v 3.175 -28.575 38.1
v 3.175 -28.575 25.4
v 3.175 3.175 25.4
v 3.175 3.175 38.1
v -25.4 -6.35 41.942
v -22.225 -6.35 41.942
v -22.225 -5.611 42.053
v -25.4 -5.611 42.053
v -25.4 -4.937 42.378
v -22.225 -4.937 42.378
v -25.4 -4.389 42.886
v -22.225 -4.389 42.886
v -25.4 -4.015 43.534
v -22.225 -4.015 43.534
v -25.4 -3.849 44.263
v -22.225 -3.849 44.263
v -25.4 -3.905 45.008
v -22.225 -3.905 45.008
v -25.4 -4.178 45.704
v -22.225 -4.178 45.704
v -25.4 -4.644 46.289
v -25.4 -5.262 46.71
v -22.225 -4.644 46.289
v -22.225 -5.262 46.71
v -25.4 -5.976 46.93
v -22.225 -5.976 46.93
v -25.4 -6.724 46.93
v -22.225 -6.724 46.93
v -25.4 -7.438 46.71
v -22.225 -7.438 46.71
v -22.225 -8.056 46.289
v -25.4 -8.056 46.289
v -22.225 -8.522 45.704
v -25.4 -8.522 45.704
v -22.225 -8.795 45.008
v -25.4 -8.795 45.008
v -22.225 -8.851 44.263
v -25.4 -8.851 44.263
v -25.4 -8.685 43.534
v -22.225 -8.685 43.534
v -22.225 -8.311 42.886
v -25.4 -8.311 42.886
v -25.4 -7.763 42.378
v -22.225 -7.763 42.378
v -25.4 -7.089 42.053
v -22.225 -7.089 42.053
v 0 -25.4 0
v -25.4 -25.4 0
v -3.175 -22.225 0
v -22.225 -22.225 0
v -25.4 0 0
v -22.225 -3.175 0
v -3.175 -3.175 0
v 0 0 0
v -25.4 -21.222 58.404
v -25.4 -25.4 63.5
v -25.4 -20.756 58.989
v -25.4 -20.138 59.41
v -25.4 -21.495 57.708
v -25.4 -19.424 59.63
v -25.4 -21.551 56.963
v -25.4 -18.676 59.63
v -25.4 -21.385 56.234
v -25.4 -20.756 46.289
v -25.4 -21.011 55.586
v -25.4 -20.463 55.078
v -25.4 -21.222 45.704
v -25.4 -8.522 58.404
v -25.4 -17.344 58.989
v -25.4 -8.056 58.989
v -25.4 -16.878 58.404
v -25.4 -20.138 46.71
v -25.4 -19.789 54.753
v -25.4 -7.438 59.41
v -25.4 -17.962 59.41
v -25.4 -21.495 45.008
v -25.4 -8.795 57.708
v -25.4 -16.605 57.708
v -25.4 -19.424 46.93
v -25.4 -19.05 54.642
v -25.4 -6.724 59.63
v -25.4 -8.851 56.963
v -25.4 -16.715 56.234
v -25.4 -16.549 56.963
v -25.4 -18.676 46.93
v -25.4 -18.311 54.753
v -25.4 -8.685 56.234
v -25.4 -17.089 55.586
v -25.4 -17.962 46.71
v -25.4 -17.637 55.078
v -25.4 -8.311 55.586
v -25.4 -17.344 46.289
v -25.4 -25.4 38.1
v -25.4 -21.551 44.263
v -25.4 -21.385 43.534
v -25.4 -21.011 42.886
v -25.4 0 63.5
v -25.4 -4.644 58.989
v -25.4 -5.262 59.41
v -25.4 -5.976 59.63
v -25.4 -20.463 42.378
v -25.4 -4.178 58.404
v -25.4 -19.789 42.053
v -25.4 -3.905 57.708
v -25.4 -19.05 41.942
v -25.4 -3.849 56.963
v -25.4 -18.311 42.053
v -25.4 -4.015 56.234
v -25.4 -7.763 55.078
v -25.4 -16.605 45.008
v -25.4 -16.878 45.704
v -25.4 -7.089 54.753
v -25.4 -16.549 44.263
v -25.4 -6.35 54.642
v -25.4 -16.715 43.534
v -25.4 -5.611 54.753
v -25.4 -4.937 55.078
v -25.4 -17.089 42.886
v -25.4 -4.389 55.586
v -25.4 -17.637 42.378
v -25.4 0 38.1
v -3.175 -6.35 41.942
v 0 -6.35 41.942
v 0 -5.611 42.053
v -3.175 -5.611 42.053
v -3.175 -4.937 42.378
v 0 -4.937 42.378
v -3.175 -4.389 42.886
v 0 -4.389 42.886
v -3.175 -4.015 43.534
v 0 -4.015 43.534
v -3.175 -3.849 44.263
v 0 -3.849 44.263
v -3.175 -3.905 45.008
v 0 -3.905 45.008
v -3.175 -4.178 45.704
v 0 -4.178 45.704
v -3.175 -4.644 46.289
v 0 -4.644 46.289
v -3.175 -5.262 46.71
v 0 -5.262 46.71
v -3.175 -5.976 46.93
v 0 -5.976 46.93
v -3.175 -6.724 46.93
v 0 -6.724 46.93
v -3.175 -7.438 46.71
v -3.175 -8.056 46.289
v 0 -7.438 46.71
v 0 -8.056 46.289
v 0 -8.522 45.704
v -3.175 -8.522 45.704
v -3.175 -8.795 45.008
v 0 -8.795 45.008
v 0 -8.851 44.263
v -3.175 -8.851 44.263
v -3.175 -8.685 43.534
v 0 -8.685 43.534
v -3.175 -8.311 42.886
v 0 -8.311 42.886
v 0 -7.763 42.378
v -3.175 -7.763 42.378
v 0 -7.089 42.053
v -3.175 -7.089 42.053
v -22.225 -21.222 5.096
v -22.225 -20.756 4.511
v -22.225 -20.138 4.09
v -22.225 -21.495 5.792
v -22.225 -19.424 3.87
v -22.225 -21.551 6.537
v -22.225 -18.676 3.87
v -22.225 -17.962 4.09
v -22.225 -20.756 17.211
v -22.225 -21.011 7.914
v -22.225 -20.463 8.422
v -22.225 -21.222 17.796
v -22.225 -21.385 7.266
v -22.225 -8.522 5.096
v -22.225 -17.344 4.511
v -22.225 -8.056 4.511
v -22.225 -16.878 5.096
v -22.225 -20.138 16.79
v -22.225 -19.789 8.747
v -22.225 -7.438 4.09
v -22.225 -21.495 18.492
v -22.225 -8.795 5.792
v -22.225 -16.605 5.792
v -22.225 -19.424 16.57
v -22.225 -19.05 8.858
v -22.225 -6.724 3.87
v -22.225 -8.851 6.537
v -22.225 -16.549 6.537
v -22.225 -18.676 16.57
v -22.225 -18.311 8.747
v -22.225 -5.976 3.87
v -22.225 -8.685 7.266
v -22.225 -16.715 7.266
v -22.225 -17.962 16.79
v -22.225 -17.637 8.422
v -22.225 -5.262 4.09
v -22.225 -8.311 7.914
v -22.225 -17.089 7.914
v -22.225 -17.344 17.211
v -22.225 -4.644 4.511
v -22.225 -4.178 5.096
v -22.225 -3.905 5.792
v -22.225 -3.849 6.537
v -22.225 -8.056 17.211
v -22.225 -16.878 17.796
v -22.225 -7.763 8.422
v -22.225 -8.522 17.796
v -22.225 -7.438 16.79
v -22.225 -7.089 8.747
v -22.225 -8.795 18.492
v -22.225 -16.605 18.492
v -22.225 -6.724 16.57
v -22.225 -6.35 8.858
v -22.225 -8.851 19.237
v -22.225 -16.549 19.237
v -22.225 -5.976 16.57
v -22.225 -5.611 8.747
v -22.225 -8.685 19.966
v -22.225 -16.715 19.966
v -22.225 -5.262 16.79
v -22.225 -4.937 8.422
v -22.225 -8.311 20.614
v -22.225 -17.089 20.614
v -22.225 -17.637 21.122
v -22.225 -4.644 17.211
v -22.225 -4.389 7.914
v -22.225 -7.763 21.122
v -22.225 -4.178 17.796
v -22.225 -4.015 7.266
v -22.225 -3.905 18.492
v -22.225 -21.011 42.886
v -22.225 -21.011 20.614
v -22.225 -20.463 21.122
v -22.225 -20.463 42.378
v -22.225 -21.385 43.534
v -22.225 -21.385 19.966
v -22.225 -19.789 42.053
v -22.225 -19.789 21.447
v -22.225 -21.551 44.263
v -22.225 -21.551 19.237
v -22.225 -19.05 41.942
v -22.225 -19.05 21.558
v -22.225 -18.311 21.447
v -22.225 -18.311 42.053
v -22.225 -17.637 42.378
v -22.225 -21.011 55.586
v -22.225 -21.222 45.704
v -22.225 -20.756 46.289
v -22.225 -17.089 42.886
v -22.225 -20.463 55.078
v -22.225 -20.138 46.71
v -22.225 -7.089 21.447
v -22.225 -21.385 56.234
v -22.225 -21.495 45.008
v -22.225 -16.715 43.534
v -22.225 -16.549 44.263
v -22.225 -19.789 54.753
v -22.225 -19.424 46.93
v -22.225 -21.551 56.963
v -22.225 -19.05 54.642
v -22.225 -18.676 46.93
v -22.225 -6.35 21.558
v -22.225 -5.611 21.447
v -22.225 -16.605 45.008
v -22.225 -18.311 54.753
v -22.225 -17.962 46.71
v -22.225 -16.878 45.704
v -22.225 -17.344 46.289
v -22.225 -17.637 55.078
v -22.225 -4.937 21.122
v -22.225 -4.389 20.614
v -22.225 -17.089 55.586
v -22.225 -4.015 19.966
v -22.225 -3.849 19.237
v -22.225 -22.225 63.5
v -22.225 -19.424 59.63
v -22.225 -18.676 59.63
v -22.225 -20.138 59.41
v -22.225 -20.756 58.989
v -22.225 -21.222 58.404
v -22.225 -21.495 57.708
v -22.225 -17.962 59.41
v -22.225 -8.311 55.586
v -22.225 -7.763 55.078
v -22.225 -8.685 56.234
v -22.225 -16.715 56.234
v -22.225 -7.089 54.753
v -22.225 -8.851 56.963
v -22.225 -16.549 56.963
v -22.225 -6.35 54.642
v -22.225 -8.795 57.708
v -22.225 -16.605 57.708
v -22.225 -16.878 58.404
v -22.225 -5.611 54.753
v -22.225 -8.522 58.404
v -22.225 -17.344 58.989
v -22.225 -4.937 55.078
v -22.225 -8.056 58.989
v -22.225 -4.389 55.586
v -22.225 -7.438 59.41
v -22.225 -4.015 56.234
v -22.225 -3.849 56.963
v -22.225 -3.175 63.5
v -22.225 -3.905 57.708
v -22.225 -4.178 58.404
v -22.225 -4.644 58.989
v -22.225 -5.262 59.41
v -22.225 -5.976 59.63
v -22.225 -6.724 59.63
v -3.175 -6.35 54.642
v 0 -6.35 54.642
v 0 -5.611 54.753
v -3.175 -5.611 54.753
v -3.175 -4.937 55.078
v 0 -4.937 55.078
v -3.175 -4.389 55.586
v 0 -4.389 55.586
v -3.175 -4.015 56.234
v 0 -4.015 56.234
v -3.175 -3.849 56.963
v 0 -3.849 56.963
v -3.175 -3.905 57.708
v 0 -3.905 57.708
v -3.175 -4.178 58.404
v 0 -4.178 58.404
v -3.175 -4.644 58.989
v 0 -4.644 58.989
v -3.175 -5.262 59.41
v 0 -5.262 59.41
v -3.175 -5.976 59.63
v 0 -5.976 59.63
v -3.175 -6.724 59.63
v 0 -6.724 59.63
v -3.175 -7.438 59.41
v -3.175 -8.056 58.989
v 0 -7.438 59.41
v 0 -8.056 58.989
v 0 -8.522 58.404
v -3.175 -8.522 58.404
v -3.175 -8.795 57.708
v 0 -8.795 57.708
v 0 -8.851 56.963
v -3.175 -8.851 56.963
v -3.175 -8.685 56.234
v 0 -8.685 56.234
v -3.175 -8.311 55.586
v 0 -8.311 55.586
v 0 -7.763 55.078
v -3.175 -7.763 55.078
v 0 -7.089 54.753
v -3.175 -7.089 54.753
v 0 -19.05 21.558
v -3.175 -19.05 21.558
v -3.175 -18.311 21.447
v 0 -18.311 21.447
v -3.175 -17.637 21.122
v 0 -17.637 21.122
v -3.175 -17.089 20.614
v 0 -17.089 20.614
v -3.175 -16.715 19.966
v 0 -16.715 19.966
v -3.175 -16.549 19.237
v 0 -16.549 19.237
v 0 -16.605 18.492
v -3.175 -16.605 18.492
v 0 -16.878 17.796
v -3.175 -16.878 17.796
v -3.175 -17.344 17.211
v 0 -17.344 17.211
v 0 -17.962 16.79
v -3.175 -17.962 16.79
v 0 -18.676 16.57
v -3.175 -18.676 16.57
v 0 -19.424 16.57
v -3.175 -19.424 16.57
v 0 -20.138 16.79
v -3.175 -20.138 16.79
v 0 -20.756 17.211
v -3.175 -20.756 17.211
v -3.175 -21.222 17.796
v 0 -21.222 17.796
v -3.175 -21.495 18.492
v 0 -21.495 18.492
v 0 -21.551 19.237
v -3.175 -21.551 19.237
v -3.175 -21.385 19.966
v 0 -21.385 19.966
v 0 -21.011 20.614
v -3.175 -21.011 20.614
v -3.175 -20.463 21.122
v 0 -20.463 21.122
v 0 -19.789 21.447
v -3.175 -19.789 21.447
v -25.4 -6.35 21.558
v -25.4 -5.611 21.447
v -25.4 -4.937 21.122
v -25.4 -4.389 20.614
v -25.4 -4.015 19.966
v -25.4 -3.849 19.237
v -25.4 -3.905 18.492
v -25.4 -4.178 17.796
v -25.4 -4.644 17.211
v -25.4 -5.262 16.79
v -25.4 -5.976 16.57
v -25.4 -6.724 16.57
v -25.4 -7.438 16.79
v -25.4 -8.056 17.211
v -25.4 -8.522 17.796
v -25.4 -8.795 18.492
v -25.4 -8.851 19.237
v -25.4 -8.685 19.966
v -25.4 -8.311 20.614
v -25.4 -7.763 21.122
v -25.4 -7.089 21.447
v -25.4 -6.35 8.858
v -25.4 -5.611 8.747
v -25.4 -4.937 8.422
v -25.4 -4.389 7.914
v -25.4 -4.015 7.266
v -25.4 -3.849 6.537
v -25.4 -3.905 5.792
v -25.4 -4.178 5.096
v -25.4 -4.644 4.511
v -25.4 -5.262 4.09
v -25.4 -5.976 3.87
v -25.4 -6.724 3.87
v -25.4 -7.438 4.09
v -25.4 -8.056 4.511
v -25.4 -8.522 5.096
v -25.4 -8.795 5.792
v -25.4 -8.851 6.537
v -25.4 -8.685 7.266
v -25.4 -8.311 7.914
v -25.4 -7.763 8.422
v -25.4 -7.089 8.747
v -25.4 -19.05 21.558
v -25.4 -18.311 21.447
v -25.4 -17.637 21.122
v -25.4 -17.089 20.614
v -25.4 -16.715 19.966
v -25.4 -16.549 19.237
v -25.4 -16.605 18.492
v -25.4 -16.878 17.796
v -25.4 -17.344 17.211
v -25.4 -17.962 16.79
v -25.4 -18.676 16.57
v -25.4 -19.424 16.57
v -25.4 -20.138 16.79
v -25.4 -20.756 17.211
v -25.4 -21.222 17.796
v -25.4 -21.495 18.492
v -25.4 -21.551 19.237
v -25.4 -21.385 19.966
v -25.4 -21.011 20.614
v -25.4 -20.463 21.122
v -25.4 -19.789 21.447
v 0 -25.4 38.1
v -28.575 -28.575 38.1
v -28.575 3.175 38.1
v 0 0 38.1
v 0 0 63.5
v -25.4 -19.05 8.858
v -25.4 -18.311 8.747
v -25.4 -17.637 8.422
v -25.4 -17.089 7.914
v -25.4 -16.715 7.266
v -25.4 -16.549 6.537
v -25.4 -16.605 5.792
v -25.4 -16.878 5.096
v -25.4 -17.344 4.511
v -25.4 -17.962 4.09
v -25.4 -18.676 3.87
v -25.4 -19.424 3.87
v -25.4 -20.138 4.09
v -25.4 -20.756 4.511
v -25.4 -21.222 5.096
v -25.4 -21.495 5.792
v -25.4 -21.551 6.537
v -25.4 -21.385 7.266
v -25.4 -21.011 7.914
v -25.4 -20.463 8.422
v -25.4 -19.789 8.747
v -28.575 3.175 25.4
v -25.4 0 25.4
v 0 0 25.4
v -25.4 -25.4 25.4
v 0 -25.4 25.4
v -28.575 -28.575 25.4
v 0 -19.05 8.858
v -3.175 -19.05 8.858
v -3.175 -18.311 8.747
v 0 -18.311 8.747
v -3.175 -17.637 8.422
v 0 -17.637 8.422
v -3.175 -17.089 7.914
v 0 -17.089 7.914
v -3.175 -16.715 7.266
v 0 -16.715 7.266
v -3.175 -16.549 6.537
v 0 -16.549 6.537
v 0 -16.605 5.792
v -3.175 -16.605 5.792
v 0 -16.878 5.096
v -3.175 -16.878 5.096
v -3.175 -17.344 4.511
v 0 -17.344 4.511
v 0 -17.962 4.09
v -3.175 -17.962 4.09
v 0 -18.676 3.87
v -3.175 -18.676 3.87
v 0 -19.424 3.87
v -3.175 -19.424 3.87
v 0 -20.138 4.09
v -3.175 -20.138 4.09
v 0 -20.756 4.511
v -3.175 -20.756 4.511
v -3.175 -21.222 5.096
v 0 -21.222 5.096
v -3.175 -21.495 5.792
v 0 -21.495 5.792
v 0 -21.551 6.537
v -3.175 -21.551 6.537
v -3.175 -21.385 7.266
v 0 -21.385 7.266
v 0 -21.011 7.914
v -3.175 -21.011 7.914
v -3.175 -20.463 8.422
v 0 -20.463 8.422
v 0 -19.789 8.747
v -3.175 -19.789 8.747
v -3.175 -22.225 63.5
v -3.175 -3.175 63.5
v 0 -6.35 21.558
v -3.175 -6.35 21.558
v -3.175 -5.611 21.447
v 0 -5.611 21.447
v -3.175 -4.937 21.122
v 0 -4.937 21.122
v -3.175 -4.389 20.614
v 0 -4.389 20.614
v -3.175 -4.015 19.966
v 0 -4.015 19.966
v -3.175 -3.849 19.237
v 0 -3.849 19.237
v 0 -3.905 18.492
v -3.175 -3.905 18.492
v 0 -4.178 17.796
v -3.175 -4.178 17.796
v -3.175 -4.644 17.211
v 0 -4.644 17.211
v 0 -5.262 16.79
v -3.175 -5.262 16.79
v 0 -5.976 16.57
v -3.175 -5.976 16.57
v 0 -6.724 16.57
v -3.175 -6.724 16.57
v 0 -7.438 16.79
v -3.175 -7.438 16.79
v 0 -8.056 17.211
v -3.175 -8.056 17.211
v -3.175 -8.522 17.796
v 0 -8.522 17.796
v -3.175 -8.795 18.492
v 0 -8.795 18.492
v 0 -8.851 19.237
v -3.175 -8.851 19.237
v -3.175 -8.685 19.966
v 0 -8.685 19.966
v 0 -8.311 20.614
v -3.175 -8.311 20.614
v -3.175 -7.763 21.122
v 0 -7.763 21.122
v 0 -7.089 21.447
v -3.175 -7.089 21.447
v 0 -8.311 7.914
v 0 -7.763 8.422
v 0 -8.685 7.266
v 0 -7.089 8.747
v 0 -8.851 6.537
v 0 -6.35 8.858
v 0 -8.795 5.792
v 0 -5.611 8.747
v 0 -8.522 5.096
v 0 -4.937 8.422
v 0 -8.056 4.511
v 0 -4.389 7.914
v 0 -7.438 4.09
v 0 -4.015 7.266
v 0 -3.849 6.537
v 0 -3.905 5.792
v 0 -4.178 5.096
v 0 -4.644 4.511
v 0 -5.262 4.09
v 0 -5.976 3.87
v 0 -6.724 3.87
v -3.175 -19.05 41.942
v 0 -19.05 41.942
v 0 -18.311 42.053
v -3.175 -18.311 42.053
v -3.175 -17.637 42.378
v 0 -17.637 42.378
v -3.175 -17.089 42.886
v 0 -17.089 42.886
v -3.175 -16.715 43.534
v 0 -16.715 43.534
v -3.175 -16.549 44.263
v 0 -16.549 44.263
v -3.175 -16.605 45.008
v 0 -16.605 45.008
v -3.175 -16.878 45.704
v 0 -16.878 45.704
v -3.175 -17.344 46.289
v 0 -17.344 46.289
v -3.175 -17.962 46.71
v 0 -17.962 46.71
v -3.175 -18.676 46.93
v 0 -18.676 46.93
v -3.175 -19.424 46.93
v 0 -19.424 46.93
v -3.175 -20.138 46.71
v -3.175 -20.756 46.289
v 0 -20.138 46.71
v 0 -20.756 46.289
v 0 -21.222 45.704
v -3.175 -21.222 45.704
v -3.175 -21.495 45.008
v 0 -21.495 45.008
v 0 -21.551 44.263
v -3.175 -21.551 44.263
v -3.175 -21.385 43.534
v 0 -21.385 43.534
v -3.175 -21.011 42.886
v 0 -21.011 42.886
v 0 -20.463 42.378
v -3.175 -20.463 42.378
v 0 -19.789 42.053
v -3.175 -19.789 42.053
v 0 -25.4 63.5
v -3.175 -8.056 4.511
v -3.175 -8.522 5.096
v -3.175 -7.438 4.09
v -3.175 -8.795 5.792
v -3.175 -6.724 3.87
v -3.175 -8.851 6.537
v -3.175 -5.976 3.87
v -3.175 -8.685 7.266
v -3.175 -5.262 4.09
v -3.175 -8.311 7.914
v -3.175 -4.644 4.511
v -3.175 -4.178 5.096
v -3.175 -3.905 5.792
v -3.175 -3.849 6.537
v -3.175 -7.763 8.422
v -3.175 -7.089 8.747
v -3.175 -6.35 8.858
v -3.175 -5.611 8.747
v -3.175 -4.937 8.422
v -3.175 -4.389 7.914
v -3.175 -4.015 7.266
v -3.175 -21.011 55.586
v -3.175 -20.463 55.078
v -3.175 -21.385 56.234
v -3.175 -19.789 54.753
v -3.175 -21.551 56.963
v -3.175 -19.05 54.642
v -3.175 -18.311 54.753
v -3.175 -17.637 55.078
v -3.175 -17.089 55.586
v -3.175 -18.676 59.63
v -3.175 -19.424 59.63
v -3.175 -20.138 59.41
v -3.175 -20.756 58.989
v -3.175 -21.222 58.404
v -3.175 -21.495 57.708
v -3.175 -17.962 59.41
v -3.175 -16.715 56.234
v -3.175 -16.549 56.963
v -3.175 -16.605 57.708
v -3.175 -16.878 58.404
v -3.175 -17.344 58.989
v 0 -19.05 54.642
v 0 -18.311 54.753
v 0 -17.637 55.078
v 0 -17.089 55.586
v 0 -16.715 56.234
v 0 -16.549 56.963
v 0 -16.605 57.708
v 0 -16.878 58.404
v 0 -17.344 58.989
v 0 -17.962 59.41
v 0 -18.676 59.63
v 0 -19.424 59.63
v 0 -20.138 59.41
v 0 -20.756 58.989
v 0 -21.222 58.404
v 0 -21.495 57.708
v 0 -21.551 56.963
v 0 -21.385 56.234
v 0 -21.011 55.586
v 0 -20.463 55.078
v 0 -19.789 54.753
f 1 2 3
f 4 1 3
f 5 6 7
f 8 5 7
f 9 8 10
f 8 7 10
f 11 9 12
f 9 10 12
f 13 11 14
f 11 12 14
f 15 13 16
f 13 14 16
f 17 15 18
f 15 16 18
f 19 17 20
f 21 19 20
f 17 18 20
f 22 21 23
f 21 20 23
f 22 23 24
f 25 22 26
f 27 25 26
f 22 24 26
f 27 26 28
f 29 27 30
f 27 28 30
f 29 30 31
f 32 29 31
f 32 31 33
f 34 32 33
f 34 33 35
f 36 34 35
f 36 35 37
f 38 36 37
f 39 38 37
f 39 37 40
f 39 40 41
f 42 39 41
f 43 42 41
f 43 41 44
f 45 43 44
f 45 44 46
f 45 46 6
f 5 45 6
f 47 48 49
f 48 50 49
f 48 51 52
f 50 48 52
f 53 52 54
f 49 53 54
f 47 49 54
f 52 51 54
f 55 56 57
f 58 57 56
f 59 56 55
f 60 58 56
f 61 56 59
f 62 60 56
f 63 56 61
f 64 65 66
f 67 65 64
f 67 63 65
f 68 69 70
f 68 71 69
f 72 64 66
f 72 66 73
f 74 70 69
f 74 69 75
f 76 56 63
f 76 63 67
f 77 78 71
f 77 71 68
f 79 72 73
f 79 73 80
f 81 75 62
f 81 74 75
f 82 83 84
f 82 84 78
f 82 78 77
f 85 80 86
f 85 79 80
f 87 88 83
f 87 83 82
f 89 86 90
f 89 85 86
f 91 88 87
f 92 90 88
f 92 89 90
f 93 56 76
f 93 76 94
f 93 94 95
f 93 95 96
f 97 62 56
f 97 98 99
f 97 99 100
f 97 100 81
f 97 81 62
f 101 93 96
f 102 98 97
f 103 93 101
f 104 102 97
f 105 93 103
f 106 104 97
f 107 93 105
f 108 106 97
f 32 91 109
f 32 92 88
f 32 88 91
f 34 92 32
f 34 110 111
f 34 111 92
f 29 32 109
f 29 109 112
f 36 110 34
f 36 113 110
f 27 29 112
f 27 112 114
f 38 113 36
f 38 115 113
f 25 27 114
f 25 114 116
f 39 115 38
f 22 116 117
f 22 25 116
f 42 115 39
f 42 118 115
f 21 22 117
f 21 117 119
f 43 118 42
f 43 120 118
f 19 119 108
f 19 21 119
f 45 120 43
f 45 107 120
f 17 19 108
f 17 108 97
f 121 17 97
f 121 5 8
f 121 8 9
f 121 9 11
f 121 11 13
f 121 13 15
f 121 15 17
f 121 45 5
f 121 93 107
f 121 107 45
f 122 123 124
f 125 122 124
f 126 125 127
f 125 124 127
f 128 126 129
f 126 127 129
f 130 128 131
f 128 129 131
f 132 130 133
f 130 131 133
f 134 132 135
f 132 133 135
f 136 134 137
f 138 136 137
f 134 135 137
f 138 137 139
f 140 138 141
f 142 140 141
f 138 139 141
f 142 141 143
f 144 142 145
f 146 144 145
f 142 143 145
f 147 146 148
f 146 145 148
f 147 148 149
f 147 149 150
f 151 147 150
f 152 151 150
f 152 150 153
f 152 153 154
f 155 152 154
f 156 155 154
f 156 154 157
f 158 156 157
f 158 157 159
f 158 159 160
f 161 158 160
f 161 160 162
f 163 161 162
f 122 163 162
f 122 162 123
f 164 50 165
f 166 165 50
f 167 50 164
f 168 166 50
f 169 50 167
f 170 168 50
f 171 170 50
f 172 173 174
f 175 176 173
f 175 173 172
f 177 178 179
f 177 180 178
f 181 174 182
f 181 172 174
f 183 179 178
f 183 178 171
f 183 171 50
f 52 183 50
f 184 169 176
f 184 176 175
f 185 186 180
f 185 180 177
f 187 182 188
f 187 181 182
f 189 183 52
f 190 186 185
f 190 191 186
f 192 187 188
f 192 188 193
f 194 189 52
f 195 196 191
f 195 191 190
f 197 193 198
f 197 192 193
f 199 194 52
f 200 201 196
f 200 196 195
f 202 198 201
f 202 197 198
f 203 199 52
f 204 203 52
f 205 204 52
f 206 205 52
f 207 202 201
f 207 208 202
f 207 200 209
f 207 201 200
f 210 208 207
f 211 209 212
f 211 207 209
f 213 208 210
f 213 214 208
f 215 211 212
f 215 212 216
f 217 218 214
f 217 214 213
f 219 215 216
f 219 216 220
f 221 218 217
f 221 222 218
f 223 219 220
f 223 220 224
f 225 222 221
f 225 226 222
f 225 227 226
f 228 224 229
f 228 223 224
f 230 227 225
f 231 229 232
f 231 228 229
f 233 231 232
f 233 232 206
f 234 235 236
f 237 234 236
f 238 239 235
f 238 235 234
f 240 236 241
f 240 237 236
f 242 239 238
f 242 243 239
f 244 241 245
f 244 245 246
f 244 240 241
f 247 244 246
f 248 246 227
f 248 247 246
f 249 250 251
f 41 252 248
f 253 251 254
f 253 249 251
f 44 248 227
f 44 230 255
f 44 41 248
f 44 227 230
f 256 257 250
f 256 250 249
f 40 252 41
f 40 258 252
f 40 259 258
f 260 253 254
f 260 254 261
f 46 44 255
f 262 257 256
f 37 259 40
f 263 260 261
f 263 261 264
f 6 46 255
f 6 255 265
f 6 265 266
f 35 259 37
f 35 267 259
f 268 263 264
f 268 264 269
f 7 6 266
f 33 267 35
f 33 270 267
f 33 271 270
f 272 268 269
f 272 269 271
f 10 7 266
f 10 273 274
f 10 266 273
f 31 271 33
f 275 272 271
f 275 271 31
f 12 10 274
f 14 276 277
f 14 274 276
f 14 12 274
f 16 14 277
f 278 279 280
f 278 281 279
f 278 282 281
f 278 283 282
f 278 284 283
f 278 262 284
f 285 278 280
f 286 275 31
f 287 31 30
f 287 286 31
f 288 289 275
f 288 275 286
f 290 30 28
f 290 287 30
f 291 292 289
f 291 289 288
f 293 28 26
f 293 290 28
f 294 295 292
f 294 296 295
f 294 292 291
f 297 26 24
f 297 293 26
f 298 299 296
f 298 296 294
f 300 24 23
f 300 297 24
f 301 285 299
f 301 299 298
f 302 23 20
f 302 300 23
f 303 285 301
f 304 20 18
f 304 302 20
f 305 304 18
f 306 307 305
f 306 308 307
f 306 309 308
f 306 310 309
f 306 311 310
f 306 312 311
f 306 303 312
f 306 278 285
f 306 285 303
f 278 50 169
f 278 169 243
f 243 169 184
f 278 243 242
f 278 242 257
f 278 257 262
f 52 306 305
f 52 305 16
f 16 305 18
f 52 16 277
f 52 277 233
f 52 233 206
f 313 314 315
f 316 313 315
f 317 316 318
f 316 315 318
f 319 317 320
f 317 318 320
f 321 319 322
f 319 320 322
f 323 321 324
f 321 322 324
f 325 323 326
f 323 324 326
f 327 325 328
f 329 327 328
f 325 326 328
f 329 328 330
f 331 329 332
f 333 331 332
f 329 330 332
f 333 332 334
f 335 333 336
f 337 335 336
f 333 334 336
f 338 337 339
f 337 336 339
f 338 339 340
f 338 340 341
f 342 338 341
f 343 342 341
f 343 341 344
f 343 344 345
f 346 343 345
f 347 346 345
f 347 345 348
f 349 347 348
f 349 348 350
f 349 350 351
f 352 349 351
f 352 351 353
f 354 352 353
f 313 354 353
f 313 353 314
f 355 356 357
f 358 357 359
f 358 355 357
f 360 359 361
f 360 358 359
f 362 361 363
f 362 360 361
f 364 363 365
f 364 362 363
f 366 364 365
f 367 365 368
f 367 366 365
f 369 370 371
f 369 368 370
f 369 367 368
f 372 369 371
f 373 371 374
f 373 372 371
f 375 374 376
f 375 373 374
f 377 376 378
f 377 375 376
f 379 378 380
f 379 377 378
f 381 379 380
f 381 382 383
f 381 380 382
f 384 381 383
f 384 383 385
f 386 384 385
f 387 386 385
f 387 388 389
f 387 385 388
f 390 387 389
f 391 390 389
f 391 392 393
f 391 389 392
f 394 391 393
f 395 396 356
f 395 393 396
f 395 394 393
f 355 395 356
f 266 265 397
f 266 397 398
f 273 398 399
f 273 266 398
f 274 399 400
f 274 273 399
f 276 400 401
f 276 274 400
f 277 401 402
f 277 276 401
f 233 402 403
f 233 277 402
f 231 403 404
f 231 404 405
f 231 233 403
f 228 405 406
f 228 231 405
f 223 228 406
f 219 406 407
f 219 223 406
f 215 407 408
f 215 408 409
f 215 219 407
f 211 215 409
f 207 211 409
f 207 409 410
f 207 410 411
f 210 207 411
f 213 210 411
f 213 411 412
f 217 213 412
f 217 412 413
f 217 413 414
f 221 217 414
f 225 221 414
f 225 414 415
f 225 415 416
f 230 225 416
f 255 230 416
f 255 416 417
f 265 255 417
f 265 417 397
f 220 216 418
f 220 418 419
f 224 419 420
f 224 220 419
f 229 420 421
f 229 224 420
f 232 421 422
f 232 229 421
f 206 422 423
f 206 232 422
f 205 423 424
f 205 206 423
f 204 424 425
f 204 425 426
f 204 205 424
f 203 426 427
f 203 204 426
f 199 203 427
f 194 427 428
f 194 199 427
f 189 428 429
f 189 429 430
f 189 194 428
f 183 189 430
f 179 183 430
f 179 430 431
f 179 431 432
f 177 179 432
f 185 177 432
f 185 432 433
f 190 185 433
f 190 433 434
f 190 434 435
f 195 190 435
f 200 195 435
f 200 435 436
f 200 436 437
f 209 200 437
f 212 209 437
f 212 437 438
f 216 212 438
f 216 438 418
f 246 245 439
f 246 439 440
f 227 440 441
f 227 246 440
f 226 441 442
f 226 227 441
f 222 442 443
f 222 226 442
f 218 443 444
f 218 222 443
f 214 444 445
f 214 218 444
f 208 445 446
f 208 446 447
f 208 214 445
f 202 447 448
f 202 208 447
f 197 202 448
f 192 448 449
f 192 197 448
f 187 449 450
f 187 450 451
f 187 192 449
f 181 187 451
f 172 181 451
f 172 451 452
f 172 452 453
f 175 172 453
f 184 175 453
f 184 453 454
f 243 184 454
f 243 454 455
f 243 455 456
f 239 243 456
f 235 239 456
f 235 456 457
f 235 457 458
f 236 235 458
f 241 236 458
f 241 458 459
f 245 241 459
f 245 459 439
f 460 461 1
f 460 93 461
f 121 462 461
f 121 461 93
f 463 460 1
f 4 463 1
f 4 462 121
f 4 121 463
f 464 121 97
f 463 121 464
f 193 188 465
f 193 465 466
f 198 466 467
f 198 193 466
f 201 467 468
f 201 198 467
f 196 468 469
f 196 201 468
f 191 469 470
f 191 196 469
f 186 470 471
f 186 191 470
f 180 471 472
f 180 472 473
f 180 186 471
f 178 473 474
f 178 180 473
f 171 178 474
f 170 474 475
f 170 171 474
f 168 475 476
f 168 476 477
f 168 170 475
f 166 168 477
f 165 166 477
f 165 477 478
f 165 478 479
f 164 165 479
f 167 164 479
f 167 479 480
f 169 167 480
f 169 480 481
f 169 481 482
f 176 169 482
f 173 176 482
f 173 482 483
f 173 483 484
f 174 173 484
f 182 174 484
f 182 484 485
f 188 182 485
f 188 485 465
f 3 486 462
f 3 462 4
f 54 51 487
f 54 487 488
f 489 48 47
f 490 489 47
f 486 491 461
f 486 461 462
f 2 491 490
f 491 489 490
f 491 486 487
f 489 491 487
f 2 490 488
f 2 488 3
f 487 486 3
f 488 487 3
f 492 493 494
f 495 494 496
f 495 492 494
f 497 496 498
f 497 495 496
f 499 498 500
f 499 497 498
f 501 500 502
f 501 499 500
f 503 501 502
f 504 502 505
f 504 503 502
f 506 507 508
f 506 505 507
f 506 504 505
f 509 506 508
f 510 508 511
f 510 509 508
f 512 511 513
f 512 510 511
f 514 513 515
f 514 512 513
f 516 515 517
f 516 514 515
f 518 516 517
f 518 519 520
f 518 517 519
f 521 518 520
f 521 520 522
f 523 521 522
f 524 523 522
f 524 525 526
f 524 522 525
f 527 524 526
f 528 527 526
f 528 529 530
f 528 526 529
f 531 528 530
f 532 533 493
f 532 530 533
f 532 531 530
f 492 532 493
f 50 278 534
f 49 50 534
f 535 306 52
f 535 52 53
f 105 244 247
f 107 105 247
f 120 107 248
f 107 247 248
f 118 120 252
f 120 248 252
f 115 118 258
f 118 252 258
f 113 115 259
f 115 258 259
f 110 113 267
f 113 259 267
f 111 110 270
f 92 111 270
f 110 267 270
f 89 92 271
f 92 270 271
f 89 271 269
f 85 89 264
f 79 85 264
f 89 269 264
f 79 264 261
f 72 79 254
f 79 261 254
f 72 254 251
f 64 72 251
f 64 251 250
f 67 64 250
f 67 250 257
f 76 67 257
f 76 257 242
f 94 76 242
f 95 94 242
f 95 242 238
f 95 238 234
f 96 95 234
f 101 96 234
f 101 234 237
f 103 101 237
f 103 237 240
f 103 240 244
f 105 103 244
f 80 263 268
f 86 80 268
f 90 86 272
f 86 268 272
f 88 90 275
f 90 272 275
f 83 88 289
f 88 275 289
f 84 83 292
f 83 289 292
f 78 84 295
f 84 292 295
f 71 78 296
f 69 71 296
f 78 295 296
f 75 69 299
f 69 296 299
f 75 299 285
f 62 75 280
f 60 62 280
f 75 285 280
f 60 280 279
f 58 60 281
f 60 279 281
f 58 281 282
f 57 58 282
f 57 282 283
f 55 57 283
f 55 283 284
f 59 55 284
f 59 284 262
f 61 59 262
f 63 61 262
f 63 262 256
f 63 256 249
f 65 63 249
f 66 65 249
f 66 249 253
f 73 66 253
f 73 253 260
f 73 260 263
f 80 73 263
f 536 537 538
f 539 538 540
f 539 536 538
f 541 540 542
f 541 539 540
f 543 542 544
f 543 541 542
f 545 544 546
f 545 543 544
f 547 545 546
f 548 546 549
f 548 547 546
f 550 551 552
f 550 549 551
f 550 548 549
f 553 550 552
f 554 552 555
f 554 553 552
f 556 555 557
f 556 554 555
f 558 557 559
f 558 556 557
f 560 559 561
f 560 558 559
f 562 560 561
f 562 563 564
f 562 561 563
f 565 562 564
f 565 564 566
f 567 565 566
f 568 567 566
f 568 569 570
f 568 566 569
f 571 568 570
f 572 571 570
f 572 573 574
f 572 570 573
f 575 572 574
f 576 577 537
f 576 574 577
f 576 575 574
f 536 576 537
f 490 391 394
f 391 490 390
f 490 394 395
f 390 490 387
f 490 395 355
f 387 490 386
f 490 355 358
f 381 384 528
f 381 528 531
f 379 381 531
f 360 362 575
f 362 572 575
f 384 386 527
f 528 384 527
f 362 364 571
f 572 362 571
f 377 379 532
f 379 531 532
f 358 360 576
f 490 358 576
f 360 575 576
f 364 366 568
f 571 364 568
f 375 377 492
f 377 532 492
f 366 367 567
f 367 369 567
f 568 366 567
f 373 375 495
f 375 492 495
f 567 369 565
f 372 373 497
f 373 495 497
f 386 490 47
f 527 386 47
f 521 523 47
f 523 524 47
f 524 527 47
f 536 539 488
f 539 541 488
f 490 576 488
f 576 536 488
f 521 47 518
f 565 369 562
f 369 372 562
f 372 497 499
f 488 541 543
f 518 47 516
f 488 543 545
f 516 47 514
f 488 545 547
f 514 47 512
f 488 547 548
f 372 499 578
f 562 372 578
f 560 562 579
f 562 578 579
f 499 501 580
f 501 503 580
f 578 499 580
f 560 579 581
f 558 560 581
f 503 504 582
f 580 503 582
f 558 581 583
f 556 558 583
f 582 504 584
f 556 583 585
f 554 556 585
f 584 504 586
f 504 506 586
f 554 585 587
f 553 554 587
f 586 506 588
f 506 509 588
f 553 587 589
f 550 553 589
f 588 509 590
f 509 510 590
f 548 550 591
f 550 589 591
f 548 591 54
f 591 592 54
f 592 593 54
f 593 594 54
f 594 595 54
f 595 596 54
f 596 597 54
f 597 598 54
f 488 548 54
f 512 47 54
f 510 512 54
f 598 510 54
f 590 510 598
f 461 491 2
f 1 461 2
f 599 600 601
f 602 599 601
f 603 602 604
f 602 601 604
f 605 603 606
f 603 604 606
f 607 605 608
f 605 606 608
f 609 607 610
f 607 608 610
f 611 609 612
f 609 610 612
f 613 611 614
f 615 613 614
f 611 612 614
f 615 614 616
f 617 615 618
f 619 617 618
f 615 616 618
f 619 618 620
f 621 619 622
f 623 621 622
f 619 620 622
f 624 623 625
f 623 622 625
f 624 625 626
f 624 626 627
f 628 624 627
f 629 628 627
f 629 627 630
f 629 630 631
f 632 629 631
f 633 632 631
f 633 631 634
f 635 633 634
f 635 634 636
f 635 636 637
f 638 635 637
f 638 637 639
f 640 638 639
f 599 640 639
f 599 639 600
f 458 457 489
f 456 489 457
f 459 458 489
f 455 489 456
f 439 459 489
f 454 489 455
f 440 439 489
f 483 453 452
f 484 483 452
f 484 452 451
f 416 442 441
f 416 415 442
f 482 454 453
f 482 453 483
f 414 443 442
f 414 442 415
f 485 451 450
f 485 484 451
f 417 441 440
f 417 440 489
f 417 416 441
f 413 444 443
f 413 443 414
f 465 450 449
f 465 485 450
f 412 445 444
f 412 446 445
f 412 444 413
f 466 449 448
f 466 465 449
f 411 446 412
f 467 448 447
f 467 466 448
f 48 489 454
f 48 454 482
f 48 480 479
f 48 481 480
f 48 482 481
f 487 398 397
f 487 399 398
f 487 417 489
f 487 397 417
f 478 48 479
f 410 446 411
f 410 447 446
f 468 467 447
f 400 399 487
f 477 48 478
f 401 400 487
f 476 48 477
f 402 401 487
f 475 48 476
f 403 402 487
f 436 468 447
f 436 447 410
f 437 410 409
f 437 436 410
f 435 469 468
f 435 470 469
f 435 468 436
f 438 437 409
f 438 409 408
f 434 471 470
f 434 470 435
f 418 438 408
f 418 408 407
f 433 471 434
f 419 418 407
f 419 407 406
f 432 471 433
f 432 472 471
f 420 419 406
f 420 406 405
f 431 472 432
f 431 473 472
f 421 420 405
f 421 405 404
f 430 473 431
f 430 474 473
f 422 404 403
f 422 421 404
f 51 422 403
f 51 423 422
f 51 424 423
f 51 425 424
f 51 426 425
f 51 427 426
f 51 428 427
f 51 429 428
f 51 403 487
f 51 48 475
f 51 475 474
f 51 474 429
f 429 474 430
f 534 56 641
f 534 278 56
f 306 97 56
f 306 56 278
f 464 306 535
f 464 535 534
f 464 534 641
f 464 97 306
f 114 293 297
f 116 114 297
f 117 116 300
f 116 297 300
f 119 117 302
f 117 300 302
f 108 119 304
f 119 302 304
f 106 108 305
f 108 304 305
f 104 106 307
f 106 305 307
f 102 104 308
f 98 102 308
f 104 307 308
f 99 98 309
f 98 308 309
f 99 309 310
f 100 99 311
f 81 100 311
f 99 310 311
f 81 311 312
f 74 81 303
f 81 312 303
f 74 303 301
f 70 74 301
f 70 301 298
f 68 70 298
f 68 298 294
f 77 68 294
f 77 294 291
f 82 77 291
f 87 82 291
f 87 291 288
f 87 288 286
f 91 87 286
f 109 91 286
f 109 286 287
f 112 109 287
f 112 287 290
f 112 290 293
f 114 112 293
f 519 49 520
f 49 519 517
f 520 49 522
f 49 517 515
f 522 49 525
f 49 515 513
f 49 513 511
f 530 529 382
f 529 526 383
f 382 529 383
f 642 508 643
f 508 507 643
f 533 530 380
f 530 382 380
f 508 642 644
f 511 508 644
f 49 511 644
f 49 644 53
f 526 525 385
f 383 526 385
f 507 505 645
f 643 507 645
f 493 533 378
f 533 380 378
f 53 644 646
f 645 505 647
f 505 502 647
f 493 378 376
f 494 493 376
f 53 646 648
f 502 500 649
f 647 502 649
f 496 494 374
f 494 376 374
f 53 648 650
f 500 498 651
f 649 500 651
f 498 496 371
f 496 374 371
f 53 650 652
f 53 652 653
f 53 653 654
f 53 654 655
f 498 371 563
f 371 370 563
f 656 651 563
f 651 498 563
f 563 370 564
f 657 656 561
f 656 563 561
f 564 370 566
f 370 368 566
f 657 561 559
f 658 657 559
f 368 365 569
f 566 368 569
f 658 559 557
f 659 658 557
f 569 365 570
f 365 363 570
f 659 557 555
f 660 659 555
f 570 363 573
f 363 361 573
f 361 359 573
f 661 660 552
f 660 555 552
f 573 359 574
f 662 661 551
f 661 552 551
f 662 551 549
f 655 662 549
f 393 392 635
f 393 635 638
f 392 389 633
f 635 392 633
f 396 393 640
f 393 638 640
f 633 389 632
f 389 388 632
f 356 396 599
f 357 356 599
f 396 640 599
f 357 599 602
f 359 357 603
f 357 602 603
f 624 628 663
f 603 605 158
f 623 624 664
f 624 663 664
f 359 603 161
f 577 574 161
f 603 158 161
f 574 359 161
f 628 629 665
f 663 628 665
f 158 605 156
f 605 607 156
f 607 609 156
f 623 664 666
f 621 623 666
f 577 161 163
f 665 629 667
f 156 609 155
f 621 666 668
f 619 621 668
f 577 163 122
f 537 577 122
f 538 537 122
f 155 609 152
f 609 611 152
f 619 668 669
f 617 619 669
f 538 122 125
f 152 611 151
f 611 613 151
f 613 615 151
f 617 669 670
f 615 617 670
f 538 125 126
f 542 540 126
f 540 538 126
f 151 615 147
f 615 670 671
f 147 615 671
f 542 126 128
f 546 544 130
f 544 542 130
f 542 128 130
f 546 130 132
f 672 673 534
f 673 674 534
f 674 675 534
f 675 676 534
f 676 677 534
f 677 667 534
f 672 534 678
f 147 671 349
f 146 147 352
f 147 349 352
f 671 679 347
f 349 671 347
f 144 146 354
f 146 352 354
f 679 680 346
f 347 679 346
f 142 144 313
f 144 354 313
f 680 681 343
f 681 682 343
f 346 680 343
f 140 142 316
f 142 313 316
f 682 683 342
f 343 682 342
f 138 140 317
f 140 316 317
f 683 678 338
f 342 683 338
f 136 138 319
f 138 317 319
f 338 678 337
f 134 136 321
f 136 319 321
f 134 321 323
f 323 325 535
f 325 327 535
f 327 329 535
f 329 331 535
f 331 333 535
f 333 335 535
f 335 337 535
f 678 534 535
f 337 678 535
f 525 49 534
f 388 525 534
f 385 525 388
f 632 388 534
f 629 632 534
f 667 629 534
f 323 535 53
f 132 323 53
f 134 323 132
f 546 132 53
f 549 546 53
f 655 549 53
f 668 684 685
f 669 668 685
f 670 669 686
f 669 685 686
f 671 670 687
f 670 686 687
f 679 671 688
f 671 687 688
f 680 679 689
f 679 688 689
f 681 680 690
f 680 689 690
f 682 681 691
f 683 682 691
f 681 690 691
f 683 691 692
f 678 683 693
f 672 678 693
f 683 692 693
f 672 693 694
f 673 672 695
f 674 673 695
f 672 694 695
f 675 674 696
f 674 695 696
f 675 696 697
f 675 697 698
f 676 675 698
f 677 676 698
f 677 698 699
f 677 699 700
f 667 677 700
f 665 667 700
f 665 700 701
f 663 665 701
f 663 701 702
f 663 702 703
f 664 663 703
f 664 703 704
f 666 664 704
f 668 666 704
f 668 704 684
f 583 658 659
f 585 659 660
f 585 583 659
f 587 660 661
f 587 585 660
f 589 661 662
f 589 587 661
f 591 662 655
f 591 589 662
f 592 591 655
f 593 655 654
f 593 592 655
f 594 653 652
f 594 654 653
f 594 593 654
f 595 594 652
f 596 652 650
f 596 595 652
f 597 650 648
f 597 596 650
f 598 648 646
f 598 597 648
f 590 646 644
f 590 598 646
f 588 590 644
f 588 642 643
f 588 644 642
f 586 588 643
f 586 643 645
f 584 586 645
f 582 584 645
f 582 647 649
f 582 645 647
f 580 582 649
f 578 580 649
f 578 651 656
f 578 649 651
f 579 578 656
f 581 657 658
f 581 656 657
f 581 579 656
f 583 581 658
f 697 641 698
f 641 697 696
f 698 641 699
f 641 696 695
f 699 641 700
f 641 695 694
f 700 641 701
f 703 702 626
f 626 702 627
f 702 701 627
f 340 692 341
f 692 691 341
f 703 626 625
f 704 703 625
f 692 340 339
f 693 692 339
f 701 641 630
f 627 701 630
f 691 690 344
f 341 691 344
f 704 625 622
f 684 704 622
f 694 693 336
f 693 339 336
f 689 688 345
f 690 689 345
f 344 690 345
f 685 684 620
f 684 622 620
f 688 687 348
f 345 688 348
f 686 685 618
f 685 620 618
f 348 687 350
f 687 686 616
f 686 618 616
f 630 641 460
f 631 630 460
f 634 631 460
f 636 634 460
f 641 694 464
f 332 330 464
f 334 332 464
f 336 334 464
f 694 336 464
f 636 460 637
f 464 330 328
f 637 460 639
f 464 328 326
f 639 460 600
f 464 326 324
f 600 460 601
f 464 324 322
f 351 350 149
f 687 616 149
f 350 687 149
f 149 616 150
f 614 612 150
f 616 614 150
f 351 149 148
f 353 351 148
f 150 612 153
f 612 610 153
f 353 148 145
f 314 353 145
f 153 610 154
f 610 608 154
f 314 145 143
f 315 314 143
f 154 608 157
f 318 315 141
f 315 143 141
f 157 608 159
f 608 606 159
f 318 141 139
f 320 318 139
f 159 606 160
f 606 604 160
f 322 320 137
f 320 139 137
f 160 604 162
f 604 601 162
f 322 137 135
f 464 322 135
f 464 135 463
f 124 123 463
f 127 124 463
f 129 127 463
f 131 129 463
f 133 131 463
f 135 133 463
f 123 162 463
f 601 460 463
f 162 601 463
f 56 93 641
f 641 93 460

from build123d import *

# Parameters (mm, degrees)
SKETCH1_W           = 25.4
SKETCH1_H           = 25.4
BOSS_EXTRUDE1_DEPTH = 25.4
SKETCH2_W           = 31.75
SKETCH2_H           = 31.75
BOSS_EXTRUDE2_DEPTH = 12.7
SKETCH3_W           = 25.4
SKETCH3_H           = 25.4
BOSS_EXTRUDE3_DEPTH = 25.4
SKETCH4_R           = 2.50825
CUT_EXTRUDE2_DEPTH  = 25.4
SKETCH5_W           = 19.05
SKETCH5_H           = 19.05
CUT_EXTRUDE3_DEPTH  = 63.5


with BuildPart() as part:
    # Sketch1 → Boss-Extrude1 (new body)
    with BuildSketch(Plane.XY):
        with Locations((-12.7, -12.7)):
            Rectangle(SKETCH1_W, SKETCH1_H)
    extrude(amount=BOSS_EXTRUDE1_DEPTH)

    # Sketch2 → Boss-Extrude2 (add)
    with BuildSketch(Plane.XY.offset(25.4)):
        with Locations((-12.7, -12.7)):
            Rectangle(SKETCH2_W, SKETCH2_H)
    extrude(amount=BOSS_EXTRUDE2_DEPTH)

    # Sketch3 → Boss-Extrude3 (add)
    with BuildSketch(Plane.XY.offset(38.1)):
        with Locations((-12.7, -12.7)):
            Rectangle(SKETCH3_W, SKETCH3_H)
    extrude(amount=BOSS_EXTRUDE3_DEPTH)

    # Sketch4 → Cut-Extrude2 (cut)
    with BuildSketch(Plane(origin=(0, 0, 0), x_dir=(0, 0, -1), z_dir=(1, 0, 0))):
        with Locations((-57.15, -6.35)):
            Circle(SKETCH4_R)
        with Locations((-44.45, -6.35)):
            Circle(SKETCH4_R)
        with Locations((-57.15, -19.05)):
            Circle(SKETCH4_R)
        with Locations((-44.45, -19.05)):
            Circle(SKETCH4_R)
    cut_extrude2 = extrude(amount=-CUT_EXTRUDE2_DEPTH, mode=Mode.SUBTRACT)

    # Sketch5 → Cut-Extrude3 (cut)
    with BuildSketch(Plane.XY.offset(63.5)):
        with Locations((-12.7, -12.7)):
            Rectangle(SKETCH5_W, SKETCH5_H)
    extrude(amount=-CUT_EXTRUDE3_DEPTH, mode=Mode.SUBTRACT)

    # Mirror1: Cut-Extrude2 across plane
    add(cut_extrude2.mirror(Plane.XY.offset(31.75)), mode=Mode.SUBTRACT)


solid = part.part
